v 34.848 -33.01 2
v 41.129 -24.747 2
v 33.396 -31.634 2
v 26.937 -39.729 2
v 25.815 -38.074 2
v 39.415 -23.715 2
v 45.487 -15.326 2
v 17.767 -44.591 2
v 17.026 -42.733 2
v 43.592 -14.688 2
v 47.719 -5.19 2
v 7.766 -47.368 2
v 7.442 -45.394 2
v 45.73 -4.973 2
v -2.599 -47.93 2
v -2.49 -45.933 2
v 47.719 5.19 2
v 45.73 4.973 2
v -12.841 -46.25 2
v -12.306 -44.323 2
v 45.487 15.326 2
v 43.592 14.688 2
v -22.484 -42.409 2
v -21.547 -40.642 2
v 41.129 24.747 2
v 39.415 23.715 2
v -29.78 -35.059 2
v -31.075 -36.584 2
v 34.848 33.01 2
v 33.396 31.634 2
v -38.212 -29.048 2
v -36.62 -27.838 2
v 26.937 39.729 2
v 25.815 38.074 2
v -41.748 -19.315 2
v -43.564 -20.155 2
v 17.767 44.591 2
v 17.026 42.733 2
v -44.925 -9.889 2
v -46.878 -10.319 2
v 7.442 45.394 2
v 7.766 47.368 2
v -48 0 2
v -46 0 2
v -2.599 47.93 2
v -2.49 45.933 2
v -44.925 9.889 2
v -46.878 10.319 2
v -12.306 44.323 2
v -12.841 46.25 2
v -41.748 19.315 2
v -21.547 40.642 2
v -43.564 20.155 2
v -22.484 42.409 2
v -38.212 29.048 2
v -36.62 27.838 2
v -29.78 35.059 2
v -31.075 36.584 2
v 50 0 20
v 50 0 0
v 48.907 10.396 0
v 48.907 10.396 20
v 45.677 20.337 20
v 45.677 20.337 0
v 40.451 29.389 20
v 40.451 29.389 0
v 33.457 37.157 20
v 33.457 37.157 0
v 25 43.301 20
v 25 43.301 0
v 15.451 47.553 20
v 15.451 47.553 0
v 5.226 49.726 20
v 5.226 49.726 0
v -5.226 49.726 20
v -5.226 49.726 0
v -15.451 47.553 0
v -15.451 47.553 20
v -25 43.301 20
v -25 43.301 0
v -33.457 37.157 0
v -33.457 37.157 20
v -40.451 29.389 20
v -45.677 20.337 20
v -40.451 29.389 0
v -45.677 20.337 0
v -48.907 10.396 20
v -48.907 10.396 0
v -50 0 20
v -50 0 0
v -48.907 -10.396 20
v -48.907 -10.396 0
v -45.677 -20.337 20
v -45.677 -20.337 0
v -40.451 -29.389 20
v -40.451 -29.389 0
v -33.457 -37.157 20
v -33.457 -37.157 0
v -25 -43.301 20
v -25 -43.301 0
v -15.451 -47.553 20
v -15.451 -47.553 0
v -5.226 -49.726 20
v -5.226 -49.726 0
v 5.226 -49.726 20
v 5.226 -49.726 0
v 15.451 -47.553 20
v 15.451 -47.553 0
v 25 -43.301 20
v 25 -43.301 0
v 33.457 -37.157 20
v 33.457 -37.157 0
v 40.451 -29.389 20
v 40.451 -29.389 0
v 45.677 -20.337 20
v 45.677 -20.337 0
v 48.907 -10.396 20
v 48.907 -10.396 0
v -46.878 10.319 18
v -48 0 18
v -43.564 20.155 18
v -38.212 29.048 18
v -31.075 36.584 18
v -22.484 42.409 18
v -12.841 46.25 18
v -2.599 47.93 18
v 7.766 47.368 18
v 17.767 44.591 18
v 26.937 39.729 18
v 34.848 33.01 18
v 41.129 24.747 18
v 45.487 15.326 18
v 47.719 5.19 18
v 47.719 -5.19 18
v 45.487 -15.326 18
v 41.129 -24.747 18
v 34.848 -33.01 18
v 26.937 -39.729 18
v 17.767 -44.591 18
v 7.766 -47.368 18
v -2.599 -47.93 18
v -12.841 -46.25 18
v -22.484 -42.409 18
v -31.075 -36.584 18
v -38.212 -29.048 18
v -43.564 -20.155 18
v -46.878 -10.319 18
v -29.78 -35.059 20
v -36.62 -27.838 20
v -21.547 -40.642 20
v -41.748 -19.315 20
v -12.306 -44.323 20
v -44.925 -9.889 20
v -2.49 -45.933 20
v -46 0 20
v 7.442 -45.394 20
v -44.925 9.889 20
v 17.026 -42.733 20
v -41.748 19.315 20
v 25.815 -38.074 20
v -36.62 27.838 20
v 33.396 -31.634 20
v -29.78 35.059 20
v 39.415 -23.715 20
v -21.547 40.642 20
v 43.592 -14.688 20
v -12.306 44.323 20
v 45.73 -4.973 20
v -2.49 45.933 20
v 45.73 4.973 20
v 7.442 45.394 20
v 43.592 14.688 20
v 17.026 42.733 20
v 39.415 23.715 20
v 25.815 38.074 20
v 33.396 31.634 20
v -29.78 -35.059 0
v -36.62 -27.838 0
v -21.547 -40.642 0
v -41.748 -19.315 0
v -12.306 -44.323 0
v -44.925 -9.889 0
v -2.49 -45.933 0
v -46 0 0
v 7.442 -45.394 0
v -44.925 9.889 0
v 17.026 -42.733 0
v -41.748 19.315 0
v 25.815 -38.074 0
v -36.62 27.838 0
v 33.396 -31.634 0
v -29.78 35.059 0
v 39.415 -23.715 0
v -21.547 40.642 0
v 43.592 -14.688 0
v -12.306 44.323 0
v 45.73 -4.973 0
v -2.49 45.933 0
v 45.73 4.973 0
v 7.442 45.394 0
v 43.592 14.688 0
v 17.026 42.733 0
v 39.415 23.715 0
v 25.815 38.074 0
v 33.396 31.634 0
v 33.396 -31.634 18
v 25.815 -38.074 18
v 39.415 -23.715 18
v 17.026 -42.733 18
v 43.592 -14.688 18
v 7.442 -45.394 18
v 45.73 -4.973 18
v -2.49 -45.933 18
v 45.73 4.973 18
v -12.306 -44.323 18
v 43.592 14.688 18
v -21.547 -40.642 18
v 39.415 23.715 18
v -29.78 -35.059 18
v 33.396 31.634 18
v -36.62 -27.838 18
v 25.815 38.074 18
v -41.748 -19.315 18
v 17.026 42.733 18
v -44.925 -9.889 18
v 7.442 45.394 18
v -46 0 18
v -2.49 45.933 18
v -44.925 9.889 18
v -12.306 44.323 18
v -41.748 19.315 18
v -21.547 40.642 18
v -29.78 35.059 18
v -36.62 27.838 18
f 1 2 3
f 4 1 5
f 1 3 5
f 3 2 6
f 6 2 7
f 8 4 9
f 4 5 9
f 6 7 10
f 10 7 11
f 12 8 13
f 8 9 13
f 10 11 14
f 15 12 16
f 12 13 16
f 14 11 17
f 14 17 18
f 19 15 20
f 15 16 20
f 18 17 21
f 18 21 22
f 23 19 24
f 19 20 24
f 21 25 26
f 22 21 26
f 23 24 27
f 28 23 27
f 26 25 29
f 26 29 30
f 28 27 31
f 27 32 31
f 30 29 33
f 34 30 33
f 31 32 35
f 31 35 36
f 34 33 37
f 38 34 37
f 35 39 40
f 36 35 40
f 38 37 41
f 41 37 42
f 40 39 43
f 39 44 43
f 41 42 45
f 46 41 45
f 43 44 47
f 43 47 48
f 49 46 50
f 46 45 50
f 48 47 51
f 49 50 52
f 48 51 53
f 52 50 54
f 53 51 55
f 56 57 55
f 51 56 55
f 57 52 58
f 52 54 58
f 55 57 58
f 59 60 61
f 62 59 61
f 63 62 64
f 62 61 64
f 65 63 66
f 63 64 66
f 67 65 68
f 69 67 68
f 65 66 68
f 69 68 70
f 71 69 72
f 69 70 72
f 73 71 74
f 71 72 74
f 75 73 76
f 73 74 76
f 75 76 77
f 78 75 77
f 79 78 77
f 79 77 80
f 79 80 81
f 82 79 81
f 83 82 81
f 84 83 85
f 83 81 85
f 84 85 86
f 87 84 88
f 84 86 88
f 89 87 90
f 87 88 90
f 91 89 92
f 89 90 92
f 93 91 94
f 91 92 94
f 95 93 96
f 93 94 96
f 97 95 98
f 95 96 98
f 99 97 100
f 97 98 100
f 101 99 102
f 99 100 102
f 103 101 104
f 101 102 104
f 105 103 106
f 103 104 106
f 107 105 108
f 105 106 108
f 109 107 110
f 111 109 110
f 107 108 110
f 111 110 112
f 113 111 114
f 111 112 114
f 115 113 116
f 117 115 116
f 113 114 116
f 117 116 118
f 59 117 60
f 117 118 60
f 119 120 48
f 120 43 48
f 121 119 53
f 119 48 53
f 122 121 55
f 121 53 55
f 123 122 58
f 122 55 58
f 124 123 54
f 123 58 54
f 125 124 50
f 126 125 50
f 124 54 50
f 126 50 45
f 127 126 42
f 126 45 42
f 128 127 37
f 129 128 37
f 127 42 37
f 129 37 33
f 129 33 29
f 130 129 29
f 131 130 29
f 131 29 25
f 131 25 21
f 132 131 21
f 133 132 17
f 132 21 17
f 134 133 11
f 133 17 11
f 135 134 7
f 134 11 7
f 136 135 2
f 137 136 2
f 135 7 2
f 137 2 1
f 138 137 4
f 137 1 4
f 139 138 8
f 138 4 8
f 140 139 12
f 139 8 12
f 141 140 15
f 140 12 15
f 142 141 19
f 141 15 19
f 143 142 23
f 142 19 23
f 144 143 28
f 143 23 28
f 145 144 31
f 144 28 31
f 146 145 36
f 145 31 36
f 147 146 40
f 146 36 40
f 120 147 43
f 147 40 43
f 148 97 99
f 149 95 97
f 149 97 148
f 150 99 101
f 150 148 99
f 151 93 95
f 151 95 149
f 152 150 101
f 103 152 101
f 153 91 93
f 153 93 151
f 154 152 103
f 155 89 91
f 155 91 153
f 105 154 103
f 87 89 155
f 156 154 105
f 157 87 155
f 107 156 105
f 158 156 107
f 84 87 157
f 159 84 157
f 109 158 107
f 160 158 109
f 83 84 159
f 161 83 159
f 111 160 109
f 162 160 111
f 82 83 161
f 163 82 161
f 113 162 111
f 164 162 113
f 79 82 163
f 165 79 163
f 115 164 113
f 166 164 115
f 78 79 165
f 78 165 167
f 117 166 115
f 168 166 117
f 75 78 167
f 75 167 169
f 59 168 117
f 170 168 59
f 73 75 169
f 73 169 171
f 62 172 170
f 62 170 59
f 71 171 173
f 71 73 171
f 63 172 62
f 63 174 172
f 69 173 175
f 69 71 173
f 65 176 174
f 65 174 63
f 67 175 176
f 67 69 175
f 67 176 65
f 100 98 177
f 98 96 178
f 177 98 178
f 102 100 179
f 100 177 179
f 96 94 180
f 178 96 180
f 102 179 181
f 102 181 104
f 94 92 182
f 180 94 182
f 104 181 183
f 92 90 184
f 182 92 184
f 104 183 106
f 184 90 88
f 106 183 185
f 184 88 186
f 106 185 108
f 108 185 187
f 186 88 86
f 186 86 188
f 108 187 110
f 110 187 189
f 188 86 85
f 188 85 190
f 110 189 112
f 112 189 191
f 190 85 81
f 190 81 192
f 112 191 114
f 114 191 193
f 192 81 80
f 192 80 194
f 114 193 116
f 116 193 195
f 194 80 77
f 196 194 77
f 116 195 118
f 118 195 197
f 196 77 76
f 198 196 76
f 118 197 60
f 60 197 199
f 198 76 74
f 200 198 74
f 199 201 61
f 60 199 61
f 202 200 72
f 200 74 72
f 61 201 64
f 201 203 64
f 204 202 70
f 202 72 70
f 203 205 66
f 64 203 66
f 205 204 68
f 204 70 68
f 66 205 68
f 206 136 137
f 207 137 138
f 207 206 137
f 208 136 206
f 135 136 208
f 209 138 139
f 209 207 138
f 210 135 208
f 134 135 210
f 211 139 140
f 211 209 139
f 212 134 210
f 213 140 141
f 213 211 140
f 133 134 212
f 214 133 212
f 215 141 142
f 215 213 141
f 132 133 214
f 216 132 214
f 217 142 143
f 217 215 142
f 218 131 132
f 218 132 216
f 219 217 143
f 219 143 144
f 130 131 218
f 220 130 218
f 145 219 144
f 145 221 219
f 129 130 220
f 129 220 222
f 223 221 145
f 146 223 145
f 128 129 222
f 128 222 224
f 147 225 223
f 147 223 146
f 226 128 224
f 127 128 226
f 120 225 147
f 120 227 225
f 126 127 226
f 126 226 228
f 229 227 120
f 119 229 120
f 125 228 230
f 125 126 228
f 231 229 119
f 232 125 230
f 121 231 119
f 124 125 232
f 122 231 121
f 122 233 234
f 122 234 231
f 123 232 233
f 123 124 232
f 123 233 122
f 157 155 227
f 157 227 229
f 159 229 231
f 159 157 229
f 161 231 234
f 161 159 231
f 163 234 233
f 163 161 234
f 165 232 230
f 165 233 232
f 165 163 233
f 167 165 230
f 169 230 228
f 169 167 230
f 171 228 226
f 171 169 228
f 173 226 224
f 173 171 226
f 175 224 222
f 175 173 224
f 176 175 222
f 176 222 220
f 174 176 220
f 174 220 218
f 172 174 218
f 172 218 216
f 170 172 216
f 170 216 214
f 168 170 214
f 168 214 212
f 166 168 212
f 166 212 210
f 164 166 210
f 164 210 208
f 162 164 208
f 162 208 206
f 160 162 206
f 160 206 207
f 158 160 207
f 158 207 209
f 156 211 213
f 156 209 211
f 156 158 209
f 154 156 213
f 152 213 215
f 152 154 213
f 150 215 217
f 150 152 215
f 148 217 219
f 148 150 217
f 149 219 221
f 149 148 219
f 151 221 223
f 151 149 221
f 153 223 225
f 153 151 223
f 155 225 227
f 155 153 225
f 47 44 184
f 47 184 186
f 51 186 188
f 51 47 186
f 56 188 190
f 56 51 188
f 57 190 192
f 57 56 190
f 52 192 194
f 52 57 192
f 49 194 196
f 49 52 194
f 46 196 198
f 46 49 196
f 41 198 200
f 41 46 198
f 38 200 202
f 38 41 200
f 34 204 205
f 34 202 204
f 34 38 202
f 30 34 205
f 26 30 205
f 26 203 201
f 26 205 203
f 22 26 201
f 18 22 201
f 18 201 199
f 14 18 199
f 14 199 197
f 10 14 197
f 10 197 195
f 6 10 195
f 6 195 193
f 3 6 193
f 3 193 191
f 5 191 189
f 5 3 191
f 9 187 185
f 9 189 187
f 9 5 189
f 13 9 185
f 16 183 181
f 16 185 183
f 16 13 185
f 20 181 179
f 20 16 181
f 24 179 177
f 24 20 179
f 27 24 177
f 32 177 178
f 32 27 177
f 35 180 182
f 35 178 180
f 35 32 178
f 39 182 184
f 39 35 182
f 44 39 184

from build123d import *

# Parameters (mm, degrees)
SKETCH1_R               = 50
BOSS_EXTRUDE1_DEPTH     = 20
CUT_EXTRUDE4_DEPTH      = 74.484692283
CUT_EXTRUDE4_DEPTH_BACK = 74.484692283
SKETCH3_R               = 46
SKETCH4_R               = 48
CUT_EXTRUDE5_DEPTH      = 8


with BuildPart() as part:
    # Sketch1 → Boss-Extrude1 (new body)
    with BuildSketch(Plane.XY):
        Circle(SKETCH1_R)
    extrude(amount=BOSS_EXTRUDE1_DEPTH)

    # Sketch3 → Cut-Extrude4 (cut, two sides: drawn at the far end of the back side and taken through both)
    with BuildSketch(Plane(origin=(0, 0, 0), x_dir=(-1, 0, 0), z_dir=(0, 0, -1)).offset(-CUT_EXTRUDE4_DEPTH_BACK)):
        Circle(SKETCH3_R)
    extrude(amount=CUT_EXTRUDE4_DEPTH + CUT_EXTRUDE4_DEPTH_BACK, mode=Mode.SUBTRACT)

    # Sketch4 → Cut-Extrude5 (cut, symmetric)
    with BuildSketch(Plane(origin=(0, 0, 10), x_dir=(-1, 0, 0), z_dir=(0, 0, -1))):
        Circle(SKETCH4_R)
    extrude(amount=CUT_EXTRUDE5_DEPTH, both=True, mode=Mode.SUBTRACT)


solid = part.part
